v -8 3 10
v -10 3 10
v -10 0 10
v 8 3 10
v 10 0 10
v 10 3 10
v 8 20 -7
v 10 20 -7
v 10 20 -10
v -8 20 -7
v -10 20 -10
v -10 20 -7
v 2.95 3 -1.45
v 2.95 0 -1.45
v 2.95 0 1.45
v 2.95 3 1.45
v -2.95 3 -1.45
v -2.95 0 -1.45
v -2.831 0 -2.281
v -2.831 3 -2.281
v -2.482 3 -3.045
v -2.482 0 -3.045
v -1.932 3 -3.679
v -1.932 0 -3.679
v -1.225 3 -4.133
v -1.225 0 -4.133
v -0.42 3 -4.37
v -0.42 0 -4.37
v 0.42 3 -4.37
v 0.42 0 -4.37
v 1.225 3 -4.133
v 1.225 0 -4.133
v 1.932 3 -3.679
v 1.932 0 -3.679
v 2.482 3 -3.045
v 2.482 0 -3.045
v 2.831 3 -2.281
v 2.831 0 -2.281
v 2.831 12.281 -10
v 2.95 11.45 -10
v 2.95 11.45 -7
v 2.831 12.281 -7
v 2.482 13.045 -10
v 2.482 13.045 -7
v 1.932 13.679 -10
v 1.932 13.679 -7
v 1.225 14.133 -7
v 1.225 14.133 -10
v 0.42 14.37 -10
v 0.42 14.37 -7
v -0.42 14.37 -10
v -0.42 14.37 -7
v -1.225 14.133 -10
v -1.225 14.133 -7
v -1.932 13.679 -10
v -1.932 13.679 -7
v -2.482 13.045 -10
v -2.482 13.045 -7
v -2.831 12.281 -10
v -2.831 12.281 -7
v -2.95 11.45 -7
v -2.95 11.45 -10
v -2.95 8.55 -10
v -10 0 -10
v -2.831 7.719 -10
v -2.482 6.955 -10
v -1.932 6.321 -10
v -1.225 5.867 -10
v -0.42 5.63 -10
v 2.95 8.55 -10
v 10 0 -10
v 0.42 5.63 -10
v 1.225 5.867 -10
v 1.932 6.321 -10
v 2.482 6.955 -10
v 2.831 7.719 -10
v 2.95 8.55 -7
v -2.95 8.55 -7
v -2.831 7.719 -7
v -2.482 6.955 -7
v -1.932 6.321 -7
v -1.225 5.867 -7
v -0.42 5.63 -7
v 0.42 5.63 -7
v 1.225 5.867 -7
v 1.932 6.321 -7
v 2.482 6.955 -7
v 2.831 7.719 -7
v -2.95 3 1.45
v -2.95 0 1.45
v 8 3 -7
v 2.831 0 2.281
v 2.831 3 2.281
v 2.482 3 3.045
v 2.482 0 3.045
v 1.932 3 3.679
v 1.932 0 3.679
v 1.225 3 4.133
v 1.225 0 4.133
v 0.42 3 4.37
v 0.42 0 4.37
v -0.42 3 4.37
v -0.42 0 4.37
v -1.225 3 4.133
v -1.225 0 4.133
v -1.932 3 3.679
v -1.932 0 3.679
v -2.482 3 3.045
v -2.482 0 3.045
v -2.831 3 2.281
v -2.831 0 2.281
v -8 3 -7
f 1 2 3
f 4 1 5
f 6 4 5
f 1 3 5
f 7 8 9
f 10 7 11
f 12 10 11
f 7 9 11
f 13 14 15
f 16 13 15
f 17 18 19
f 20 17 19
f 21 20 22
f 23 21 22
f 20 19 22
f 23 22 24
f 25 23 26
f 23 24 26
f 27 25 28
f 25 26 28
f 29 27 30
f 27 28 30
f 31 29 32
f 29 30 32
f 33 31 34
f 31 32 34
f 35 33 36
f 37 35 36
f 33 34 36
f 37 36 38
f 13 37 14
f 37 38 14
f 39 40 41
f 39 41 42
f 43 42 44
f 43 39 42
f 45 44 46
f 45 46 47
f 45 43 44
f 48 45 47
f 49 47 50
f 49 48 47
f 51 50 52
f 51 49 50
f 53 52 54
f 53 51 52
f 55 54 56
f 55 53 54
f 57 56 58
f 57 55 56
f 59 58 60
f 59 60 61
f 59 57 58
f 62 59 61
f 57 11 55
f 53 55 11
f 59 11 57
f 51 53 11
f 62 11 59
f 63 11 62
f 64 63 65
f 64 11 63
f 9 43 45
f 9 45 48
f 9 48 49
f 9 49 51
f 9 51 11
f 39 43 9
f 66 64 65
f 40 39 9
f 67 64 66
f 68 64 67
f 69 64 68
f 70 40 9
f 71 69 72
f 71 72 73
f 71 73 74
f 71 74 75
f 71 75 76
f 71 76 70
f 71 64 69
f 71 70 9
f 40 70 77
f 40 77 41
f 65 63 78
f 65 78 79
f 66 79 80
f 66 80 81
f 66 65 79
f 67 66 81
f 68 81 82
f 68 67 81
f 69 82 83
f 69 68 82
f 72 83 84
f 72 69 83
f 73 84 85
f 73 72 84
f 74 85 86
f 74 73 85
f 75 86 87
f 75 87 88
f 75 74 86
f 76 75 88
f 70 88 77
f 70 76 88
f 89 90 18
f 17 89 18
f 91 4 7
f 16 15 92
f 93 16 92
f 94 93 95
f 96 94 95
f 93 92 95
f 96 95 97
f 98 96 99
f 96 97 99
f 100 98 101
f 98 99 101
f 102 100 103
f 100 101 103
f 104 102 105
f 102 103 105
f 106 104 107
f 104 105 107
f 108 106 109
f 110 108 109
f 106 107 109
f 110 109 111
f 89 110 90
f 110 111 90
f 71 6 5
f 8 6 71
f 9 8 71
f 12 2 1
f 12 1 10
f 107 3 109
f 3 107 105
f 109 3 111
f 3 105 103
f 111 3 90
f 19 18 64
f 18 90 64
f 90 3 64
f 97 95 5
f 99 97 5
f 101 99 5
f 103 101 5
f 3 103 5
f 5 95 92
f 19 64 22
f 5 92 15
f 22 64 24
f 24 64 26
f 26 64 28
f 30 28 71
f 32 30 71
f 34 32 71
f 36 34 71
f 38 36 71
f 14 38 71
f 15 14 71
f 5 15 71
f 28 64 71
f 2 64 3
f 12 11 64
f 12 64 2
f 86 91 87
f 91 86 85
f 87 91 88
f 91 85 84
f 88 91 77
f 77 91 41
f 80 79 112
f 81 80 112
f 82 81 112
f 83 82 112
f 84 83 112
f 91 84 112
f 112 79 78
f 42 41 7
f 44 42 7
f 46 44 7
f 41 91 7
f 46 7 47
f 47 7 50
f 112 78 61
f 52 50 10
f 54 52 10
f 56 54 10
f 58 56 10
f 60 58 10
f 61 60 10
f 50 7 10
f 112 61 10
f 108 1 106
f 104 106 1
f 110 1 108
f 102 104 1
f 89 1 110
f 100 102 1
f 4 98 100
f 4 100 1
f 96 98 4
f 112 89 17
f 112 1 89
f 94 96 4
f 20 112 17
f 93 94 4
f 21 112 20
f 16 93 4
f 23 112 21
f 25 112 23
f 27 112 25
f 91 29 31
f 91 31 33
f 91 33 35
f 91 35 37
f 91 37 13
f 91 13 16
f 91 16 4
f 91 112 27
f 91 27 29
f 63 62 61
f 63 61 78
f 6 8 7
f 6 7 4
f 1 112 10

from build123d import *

# Parameters (mm, degrees)
SKETCH1_W           = 20
SKETCH1_H           = 20
BOSS_EXTRUDE1_DEPTH = 3
SKETCH2_W           = 20
SKETCH2_H           = 20
BOSS_EXTRUDE2_DEPTH = 3
BOSS_EXTRUDE3_DEPTH = 2
BOSS_EXTRUDE4_DEPTH = 2


with BuildPart() as part:
    # Sketch1 → Boss-Extrude1 (new body)
    with BuildSketch(Plane(origin=(0, 0, 0), x_dir=(1, 0, 0), z_dir=(0, 1, 0))):
        Rectangle(SKETCH1_W, SKETCH1_H)
        with BuildLine():
            Line((-2.95, -1.45), (-2.95, 1.45))
            ThreePointArc((-2.95, 1.45), (0, 4.4), (2.95, 1.45))
            Line((2.95, 1.45), (2.95, -1.45))
            ThreePointArc((2.95, -1.45), (0, -4.4), (-2.95, -1.45))
        make_face(mode=Mode.SUBTRACT)
    extrude(amount=BOSS_EXTRUDE1_DEPTH)

    # Sketch2 → Boss-Extrude2 (add)
    with BuildSketch(Plane(origin=(0, 0, -10), x_dir=(-1, 0, 0), z_dir=(0, 0, -1))):
        with Locations((0, 10)):
            Rectangle(SKETCH2_W, SKETCH2_H)
        with BuildLine():
            Line((-2.95, 8.55), (-2.95, 11.45))
            ThreePointArc((-2.95, 11.45), (0, 14.4), (2.95, 11.45))
            Line((2.95, 11.45), (2.95, 8.55))
            ThreePointArc((2.95, 8.55), (0, 5.6), (-2.95, 8.55))
        make_face(mode=Mode.SUBTRACT)
    extrude(amount=-BOSS_EXTRUDE2_DEPTH)

    # Sketch3 → Boss-Extrude3 (add)
    with BuildSketch(Plane(origin=(10, 0, 0), x_dir=(0, 0, -1), z_dir=(1, 0, 0))):
        Polygon((7, 20), (-10, 3), (7, 3), align=None)
    extrude(amount=-BOSS_EXTRUDE3_DEPTH)

    # Sketch4 → Boss-Extrude4 (add)
    with BuildSketch(Plane.ZY.offset(10)):
        Polygon((-7, 20), (-7, 3), (10, 3), align=None)
    extrude(amount=-BOSS_EXTRUDE4_DEPTH)


solid = part.part
